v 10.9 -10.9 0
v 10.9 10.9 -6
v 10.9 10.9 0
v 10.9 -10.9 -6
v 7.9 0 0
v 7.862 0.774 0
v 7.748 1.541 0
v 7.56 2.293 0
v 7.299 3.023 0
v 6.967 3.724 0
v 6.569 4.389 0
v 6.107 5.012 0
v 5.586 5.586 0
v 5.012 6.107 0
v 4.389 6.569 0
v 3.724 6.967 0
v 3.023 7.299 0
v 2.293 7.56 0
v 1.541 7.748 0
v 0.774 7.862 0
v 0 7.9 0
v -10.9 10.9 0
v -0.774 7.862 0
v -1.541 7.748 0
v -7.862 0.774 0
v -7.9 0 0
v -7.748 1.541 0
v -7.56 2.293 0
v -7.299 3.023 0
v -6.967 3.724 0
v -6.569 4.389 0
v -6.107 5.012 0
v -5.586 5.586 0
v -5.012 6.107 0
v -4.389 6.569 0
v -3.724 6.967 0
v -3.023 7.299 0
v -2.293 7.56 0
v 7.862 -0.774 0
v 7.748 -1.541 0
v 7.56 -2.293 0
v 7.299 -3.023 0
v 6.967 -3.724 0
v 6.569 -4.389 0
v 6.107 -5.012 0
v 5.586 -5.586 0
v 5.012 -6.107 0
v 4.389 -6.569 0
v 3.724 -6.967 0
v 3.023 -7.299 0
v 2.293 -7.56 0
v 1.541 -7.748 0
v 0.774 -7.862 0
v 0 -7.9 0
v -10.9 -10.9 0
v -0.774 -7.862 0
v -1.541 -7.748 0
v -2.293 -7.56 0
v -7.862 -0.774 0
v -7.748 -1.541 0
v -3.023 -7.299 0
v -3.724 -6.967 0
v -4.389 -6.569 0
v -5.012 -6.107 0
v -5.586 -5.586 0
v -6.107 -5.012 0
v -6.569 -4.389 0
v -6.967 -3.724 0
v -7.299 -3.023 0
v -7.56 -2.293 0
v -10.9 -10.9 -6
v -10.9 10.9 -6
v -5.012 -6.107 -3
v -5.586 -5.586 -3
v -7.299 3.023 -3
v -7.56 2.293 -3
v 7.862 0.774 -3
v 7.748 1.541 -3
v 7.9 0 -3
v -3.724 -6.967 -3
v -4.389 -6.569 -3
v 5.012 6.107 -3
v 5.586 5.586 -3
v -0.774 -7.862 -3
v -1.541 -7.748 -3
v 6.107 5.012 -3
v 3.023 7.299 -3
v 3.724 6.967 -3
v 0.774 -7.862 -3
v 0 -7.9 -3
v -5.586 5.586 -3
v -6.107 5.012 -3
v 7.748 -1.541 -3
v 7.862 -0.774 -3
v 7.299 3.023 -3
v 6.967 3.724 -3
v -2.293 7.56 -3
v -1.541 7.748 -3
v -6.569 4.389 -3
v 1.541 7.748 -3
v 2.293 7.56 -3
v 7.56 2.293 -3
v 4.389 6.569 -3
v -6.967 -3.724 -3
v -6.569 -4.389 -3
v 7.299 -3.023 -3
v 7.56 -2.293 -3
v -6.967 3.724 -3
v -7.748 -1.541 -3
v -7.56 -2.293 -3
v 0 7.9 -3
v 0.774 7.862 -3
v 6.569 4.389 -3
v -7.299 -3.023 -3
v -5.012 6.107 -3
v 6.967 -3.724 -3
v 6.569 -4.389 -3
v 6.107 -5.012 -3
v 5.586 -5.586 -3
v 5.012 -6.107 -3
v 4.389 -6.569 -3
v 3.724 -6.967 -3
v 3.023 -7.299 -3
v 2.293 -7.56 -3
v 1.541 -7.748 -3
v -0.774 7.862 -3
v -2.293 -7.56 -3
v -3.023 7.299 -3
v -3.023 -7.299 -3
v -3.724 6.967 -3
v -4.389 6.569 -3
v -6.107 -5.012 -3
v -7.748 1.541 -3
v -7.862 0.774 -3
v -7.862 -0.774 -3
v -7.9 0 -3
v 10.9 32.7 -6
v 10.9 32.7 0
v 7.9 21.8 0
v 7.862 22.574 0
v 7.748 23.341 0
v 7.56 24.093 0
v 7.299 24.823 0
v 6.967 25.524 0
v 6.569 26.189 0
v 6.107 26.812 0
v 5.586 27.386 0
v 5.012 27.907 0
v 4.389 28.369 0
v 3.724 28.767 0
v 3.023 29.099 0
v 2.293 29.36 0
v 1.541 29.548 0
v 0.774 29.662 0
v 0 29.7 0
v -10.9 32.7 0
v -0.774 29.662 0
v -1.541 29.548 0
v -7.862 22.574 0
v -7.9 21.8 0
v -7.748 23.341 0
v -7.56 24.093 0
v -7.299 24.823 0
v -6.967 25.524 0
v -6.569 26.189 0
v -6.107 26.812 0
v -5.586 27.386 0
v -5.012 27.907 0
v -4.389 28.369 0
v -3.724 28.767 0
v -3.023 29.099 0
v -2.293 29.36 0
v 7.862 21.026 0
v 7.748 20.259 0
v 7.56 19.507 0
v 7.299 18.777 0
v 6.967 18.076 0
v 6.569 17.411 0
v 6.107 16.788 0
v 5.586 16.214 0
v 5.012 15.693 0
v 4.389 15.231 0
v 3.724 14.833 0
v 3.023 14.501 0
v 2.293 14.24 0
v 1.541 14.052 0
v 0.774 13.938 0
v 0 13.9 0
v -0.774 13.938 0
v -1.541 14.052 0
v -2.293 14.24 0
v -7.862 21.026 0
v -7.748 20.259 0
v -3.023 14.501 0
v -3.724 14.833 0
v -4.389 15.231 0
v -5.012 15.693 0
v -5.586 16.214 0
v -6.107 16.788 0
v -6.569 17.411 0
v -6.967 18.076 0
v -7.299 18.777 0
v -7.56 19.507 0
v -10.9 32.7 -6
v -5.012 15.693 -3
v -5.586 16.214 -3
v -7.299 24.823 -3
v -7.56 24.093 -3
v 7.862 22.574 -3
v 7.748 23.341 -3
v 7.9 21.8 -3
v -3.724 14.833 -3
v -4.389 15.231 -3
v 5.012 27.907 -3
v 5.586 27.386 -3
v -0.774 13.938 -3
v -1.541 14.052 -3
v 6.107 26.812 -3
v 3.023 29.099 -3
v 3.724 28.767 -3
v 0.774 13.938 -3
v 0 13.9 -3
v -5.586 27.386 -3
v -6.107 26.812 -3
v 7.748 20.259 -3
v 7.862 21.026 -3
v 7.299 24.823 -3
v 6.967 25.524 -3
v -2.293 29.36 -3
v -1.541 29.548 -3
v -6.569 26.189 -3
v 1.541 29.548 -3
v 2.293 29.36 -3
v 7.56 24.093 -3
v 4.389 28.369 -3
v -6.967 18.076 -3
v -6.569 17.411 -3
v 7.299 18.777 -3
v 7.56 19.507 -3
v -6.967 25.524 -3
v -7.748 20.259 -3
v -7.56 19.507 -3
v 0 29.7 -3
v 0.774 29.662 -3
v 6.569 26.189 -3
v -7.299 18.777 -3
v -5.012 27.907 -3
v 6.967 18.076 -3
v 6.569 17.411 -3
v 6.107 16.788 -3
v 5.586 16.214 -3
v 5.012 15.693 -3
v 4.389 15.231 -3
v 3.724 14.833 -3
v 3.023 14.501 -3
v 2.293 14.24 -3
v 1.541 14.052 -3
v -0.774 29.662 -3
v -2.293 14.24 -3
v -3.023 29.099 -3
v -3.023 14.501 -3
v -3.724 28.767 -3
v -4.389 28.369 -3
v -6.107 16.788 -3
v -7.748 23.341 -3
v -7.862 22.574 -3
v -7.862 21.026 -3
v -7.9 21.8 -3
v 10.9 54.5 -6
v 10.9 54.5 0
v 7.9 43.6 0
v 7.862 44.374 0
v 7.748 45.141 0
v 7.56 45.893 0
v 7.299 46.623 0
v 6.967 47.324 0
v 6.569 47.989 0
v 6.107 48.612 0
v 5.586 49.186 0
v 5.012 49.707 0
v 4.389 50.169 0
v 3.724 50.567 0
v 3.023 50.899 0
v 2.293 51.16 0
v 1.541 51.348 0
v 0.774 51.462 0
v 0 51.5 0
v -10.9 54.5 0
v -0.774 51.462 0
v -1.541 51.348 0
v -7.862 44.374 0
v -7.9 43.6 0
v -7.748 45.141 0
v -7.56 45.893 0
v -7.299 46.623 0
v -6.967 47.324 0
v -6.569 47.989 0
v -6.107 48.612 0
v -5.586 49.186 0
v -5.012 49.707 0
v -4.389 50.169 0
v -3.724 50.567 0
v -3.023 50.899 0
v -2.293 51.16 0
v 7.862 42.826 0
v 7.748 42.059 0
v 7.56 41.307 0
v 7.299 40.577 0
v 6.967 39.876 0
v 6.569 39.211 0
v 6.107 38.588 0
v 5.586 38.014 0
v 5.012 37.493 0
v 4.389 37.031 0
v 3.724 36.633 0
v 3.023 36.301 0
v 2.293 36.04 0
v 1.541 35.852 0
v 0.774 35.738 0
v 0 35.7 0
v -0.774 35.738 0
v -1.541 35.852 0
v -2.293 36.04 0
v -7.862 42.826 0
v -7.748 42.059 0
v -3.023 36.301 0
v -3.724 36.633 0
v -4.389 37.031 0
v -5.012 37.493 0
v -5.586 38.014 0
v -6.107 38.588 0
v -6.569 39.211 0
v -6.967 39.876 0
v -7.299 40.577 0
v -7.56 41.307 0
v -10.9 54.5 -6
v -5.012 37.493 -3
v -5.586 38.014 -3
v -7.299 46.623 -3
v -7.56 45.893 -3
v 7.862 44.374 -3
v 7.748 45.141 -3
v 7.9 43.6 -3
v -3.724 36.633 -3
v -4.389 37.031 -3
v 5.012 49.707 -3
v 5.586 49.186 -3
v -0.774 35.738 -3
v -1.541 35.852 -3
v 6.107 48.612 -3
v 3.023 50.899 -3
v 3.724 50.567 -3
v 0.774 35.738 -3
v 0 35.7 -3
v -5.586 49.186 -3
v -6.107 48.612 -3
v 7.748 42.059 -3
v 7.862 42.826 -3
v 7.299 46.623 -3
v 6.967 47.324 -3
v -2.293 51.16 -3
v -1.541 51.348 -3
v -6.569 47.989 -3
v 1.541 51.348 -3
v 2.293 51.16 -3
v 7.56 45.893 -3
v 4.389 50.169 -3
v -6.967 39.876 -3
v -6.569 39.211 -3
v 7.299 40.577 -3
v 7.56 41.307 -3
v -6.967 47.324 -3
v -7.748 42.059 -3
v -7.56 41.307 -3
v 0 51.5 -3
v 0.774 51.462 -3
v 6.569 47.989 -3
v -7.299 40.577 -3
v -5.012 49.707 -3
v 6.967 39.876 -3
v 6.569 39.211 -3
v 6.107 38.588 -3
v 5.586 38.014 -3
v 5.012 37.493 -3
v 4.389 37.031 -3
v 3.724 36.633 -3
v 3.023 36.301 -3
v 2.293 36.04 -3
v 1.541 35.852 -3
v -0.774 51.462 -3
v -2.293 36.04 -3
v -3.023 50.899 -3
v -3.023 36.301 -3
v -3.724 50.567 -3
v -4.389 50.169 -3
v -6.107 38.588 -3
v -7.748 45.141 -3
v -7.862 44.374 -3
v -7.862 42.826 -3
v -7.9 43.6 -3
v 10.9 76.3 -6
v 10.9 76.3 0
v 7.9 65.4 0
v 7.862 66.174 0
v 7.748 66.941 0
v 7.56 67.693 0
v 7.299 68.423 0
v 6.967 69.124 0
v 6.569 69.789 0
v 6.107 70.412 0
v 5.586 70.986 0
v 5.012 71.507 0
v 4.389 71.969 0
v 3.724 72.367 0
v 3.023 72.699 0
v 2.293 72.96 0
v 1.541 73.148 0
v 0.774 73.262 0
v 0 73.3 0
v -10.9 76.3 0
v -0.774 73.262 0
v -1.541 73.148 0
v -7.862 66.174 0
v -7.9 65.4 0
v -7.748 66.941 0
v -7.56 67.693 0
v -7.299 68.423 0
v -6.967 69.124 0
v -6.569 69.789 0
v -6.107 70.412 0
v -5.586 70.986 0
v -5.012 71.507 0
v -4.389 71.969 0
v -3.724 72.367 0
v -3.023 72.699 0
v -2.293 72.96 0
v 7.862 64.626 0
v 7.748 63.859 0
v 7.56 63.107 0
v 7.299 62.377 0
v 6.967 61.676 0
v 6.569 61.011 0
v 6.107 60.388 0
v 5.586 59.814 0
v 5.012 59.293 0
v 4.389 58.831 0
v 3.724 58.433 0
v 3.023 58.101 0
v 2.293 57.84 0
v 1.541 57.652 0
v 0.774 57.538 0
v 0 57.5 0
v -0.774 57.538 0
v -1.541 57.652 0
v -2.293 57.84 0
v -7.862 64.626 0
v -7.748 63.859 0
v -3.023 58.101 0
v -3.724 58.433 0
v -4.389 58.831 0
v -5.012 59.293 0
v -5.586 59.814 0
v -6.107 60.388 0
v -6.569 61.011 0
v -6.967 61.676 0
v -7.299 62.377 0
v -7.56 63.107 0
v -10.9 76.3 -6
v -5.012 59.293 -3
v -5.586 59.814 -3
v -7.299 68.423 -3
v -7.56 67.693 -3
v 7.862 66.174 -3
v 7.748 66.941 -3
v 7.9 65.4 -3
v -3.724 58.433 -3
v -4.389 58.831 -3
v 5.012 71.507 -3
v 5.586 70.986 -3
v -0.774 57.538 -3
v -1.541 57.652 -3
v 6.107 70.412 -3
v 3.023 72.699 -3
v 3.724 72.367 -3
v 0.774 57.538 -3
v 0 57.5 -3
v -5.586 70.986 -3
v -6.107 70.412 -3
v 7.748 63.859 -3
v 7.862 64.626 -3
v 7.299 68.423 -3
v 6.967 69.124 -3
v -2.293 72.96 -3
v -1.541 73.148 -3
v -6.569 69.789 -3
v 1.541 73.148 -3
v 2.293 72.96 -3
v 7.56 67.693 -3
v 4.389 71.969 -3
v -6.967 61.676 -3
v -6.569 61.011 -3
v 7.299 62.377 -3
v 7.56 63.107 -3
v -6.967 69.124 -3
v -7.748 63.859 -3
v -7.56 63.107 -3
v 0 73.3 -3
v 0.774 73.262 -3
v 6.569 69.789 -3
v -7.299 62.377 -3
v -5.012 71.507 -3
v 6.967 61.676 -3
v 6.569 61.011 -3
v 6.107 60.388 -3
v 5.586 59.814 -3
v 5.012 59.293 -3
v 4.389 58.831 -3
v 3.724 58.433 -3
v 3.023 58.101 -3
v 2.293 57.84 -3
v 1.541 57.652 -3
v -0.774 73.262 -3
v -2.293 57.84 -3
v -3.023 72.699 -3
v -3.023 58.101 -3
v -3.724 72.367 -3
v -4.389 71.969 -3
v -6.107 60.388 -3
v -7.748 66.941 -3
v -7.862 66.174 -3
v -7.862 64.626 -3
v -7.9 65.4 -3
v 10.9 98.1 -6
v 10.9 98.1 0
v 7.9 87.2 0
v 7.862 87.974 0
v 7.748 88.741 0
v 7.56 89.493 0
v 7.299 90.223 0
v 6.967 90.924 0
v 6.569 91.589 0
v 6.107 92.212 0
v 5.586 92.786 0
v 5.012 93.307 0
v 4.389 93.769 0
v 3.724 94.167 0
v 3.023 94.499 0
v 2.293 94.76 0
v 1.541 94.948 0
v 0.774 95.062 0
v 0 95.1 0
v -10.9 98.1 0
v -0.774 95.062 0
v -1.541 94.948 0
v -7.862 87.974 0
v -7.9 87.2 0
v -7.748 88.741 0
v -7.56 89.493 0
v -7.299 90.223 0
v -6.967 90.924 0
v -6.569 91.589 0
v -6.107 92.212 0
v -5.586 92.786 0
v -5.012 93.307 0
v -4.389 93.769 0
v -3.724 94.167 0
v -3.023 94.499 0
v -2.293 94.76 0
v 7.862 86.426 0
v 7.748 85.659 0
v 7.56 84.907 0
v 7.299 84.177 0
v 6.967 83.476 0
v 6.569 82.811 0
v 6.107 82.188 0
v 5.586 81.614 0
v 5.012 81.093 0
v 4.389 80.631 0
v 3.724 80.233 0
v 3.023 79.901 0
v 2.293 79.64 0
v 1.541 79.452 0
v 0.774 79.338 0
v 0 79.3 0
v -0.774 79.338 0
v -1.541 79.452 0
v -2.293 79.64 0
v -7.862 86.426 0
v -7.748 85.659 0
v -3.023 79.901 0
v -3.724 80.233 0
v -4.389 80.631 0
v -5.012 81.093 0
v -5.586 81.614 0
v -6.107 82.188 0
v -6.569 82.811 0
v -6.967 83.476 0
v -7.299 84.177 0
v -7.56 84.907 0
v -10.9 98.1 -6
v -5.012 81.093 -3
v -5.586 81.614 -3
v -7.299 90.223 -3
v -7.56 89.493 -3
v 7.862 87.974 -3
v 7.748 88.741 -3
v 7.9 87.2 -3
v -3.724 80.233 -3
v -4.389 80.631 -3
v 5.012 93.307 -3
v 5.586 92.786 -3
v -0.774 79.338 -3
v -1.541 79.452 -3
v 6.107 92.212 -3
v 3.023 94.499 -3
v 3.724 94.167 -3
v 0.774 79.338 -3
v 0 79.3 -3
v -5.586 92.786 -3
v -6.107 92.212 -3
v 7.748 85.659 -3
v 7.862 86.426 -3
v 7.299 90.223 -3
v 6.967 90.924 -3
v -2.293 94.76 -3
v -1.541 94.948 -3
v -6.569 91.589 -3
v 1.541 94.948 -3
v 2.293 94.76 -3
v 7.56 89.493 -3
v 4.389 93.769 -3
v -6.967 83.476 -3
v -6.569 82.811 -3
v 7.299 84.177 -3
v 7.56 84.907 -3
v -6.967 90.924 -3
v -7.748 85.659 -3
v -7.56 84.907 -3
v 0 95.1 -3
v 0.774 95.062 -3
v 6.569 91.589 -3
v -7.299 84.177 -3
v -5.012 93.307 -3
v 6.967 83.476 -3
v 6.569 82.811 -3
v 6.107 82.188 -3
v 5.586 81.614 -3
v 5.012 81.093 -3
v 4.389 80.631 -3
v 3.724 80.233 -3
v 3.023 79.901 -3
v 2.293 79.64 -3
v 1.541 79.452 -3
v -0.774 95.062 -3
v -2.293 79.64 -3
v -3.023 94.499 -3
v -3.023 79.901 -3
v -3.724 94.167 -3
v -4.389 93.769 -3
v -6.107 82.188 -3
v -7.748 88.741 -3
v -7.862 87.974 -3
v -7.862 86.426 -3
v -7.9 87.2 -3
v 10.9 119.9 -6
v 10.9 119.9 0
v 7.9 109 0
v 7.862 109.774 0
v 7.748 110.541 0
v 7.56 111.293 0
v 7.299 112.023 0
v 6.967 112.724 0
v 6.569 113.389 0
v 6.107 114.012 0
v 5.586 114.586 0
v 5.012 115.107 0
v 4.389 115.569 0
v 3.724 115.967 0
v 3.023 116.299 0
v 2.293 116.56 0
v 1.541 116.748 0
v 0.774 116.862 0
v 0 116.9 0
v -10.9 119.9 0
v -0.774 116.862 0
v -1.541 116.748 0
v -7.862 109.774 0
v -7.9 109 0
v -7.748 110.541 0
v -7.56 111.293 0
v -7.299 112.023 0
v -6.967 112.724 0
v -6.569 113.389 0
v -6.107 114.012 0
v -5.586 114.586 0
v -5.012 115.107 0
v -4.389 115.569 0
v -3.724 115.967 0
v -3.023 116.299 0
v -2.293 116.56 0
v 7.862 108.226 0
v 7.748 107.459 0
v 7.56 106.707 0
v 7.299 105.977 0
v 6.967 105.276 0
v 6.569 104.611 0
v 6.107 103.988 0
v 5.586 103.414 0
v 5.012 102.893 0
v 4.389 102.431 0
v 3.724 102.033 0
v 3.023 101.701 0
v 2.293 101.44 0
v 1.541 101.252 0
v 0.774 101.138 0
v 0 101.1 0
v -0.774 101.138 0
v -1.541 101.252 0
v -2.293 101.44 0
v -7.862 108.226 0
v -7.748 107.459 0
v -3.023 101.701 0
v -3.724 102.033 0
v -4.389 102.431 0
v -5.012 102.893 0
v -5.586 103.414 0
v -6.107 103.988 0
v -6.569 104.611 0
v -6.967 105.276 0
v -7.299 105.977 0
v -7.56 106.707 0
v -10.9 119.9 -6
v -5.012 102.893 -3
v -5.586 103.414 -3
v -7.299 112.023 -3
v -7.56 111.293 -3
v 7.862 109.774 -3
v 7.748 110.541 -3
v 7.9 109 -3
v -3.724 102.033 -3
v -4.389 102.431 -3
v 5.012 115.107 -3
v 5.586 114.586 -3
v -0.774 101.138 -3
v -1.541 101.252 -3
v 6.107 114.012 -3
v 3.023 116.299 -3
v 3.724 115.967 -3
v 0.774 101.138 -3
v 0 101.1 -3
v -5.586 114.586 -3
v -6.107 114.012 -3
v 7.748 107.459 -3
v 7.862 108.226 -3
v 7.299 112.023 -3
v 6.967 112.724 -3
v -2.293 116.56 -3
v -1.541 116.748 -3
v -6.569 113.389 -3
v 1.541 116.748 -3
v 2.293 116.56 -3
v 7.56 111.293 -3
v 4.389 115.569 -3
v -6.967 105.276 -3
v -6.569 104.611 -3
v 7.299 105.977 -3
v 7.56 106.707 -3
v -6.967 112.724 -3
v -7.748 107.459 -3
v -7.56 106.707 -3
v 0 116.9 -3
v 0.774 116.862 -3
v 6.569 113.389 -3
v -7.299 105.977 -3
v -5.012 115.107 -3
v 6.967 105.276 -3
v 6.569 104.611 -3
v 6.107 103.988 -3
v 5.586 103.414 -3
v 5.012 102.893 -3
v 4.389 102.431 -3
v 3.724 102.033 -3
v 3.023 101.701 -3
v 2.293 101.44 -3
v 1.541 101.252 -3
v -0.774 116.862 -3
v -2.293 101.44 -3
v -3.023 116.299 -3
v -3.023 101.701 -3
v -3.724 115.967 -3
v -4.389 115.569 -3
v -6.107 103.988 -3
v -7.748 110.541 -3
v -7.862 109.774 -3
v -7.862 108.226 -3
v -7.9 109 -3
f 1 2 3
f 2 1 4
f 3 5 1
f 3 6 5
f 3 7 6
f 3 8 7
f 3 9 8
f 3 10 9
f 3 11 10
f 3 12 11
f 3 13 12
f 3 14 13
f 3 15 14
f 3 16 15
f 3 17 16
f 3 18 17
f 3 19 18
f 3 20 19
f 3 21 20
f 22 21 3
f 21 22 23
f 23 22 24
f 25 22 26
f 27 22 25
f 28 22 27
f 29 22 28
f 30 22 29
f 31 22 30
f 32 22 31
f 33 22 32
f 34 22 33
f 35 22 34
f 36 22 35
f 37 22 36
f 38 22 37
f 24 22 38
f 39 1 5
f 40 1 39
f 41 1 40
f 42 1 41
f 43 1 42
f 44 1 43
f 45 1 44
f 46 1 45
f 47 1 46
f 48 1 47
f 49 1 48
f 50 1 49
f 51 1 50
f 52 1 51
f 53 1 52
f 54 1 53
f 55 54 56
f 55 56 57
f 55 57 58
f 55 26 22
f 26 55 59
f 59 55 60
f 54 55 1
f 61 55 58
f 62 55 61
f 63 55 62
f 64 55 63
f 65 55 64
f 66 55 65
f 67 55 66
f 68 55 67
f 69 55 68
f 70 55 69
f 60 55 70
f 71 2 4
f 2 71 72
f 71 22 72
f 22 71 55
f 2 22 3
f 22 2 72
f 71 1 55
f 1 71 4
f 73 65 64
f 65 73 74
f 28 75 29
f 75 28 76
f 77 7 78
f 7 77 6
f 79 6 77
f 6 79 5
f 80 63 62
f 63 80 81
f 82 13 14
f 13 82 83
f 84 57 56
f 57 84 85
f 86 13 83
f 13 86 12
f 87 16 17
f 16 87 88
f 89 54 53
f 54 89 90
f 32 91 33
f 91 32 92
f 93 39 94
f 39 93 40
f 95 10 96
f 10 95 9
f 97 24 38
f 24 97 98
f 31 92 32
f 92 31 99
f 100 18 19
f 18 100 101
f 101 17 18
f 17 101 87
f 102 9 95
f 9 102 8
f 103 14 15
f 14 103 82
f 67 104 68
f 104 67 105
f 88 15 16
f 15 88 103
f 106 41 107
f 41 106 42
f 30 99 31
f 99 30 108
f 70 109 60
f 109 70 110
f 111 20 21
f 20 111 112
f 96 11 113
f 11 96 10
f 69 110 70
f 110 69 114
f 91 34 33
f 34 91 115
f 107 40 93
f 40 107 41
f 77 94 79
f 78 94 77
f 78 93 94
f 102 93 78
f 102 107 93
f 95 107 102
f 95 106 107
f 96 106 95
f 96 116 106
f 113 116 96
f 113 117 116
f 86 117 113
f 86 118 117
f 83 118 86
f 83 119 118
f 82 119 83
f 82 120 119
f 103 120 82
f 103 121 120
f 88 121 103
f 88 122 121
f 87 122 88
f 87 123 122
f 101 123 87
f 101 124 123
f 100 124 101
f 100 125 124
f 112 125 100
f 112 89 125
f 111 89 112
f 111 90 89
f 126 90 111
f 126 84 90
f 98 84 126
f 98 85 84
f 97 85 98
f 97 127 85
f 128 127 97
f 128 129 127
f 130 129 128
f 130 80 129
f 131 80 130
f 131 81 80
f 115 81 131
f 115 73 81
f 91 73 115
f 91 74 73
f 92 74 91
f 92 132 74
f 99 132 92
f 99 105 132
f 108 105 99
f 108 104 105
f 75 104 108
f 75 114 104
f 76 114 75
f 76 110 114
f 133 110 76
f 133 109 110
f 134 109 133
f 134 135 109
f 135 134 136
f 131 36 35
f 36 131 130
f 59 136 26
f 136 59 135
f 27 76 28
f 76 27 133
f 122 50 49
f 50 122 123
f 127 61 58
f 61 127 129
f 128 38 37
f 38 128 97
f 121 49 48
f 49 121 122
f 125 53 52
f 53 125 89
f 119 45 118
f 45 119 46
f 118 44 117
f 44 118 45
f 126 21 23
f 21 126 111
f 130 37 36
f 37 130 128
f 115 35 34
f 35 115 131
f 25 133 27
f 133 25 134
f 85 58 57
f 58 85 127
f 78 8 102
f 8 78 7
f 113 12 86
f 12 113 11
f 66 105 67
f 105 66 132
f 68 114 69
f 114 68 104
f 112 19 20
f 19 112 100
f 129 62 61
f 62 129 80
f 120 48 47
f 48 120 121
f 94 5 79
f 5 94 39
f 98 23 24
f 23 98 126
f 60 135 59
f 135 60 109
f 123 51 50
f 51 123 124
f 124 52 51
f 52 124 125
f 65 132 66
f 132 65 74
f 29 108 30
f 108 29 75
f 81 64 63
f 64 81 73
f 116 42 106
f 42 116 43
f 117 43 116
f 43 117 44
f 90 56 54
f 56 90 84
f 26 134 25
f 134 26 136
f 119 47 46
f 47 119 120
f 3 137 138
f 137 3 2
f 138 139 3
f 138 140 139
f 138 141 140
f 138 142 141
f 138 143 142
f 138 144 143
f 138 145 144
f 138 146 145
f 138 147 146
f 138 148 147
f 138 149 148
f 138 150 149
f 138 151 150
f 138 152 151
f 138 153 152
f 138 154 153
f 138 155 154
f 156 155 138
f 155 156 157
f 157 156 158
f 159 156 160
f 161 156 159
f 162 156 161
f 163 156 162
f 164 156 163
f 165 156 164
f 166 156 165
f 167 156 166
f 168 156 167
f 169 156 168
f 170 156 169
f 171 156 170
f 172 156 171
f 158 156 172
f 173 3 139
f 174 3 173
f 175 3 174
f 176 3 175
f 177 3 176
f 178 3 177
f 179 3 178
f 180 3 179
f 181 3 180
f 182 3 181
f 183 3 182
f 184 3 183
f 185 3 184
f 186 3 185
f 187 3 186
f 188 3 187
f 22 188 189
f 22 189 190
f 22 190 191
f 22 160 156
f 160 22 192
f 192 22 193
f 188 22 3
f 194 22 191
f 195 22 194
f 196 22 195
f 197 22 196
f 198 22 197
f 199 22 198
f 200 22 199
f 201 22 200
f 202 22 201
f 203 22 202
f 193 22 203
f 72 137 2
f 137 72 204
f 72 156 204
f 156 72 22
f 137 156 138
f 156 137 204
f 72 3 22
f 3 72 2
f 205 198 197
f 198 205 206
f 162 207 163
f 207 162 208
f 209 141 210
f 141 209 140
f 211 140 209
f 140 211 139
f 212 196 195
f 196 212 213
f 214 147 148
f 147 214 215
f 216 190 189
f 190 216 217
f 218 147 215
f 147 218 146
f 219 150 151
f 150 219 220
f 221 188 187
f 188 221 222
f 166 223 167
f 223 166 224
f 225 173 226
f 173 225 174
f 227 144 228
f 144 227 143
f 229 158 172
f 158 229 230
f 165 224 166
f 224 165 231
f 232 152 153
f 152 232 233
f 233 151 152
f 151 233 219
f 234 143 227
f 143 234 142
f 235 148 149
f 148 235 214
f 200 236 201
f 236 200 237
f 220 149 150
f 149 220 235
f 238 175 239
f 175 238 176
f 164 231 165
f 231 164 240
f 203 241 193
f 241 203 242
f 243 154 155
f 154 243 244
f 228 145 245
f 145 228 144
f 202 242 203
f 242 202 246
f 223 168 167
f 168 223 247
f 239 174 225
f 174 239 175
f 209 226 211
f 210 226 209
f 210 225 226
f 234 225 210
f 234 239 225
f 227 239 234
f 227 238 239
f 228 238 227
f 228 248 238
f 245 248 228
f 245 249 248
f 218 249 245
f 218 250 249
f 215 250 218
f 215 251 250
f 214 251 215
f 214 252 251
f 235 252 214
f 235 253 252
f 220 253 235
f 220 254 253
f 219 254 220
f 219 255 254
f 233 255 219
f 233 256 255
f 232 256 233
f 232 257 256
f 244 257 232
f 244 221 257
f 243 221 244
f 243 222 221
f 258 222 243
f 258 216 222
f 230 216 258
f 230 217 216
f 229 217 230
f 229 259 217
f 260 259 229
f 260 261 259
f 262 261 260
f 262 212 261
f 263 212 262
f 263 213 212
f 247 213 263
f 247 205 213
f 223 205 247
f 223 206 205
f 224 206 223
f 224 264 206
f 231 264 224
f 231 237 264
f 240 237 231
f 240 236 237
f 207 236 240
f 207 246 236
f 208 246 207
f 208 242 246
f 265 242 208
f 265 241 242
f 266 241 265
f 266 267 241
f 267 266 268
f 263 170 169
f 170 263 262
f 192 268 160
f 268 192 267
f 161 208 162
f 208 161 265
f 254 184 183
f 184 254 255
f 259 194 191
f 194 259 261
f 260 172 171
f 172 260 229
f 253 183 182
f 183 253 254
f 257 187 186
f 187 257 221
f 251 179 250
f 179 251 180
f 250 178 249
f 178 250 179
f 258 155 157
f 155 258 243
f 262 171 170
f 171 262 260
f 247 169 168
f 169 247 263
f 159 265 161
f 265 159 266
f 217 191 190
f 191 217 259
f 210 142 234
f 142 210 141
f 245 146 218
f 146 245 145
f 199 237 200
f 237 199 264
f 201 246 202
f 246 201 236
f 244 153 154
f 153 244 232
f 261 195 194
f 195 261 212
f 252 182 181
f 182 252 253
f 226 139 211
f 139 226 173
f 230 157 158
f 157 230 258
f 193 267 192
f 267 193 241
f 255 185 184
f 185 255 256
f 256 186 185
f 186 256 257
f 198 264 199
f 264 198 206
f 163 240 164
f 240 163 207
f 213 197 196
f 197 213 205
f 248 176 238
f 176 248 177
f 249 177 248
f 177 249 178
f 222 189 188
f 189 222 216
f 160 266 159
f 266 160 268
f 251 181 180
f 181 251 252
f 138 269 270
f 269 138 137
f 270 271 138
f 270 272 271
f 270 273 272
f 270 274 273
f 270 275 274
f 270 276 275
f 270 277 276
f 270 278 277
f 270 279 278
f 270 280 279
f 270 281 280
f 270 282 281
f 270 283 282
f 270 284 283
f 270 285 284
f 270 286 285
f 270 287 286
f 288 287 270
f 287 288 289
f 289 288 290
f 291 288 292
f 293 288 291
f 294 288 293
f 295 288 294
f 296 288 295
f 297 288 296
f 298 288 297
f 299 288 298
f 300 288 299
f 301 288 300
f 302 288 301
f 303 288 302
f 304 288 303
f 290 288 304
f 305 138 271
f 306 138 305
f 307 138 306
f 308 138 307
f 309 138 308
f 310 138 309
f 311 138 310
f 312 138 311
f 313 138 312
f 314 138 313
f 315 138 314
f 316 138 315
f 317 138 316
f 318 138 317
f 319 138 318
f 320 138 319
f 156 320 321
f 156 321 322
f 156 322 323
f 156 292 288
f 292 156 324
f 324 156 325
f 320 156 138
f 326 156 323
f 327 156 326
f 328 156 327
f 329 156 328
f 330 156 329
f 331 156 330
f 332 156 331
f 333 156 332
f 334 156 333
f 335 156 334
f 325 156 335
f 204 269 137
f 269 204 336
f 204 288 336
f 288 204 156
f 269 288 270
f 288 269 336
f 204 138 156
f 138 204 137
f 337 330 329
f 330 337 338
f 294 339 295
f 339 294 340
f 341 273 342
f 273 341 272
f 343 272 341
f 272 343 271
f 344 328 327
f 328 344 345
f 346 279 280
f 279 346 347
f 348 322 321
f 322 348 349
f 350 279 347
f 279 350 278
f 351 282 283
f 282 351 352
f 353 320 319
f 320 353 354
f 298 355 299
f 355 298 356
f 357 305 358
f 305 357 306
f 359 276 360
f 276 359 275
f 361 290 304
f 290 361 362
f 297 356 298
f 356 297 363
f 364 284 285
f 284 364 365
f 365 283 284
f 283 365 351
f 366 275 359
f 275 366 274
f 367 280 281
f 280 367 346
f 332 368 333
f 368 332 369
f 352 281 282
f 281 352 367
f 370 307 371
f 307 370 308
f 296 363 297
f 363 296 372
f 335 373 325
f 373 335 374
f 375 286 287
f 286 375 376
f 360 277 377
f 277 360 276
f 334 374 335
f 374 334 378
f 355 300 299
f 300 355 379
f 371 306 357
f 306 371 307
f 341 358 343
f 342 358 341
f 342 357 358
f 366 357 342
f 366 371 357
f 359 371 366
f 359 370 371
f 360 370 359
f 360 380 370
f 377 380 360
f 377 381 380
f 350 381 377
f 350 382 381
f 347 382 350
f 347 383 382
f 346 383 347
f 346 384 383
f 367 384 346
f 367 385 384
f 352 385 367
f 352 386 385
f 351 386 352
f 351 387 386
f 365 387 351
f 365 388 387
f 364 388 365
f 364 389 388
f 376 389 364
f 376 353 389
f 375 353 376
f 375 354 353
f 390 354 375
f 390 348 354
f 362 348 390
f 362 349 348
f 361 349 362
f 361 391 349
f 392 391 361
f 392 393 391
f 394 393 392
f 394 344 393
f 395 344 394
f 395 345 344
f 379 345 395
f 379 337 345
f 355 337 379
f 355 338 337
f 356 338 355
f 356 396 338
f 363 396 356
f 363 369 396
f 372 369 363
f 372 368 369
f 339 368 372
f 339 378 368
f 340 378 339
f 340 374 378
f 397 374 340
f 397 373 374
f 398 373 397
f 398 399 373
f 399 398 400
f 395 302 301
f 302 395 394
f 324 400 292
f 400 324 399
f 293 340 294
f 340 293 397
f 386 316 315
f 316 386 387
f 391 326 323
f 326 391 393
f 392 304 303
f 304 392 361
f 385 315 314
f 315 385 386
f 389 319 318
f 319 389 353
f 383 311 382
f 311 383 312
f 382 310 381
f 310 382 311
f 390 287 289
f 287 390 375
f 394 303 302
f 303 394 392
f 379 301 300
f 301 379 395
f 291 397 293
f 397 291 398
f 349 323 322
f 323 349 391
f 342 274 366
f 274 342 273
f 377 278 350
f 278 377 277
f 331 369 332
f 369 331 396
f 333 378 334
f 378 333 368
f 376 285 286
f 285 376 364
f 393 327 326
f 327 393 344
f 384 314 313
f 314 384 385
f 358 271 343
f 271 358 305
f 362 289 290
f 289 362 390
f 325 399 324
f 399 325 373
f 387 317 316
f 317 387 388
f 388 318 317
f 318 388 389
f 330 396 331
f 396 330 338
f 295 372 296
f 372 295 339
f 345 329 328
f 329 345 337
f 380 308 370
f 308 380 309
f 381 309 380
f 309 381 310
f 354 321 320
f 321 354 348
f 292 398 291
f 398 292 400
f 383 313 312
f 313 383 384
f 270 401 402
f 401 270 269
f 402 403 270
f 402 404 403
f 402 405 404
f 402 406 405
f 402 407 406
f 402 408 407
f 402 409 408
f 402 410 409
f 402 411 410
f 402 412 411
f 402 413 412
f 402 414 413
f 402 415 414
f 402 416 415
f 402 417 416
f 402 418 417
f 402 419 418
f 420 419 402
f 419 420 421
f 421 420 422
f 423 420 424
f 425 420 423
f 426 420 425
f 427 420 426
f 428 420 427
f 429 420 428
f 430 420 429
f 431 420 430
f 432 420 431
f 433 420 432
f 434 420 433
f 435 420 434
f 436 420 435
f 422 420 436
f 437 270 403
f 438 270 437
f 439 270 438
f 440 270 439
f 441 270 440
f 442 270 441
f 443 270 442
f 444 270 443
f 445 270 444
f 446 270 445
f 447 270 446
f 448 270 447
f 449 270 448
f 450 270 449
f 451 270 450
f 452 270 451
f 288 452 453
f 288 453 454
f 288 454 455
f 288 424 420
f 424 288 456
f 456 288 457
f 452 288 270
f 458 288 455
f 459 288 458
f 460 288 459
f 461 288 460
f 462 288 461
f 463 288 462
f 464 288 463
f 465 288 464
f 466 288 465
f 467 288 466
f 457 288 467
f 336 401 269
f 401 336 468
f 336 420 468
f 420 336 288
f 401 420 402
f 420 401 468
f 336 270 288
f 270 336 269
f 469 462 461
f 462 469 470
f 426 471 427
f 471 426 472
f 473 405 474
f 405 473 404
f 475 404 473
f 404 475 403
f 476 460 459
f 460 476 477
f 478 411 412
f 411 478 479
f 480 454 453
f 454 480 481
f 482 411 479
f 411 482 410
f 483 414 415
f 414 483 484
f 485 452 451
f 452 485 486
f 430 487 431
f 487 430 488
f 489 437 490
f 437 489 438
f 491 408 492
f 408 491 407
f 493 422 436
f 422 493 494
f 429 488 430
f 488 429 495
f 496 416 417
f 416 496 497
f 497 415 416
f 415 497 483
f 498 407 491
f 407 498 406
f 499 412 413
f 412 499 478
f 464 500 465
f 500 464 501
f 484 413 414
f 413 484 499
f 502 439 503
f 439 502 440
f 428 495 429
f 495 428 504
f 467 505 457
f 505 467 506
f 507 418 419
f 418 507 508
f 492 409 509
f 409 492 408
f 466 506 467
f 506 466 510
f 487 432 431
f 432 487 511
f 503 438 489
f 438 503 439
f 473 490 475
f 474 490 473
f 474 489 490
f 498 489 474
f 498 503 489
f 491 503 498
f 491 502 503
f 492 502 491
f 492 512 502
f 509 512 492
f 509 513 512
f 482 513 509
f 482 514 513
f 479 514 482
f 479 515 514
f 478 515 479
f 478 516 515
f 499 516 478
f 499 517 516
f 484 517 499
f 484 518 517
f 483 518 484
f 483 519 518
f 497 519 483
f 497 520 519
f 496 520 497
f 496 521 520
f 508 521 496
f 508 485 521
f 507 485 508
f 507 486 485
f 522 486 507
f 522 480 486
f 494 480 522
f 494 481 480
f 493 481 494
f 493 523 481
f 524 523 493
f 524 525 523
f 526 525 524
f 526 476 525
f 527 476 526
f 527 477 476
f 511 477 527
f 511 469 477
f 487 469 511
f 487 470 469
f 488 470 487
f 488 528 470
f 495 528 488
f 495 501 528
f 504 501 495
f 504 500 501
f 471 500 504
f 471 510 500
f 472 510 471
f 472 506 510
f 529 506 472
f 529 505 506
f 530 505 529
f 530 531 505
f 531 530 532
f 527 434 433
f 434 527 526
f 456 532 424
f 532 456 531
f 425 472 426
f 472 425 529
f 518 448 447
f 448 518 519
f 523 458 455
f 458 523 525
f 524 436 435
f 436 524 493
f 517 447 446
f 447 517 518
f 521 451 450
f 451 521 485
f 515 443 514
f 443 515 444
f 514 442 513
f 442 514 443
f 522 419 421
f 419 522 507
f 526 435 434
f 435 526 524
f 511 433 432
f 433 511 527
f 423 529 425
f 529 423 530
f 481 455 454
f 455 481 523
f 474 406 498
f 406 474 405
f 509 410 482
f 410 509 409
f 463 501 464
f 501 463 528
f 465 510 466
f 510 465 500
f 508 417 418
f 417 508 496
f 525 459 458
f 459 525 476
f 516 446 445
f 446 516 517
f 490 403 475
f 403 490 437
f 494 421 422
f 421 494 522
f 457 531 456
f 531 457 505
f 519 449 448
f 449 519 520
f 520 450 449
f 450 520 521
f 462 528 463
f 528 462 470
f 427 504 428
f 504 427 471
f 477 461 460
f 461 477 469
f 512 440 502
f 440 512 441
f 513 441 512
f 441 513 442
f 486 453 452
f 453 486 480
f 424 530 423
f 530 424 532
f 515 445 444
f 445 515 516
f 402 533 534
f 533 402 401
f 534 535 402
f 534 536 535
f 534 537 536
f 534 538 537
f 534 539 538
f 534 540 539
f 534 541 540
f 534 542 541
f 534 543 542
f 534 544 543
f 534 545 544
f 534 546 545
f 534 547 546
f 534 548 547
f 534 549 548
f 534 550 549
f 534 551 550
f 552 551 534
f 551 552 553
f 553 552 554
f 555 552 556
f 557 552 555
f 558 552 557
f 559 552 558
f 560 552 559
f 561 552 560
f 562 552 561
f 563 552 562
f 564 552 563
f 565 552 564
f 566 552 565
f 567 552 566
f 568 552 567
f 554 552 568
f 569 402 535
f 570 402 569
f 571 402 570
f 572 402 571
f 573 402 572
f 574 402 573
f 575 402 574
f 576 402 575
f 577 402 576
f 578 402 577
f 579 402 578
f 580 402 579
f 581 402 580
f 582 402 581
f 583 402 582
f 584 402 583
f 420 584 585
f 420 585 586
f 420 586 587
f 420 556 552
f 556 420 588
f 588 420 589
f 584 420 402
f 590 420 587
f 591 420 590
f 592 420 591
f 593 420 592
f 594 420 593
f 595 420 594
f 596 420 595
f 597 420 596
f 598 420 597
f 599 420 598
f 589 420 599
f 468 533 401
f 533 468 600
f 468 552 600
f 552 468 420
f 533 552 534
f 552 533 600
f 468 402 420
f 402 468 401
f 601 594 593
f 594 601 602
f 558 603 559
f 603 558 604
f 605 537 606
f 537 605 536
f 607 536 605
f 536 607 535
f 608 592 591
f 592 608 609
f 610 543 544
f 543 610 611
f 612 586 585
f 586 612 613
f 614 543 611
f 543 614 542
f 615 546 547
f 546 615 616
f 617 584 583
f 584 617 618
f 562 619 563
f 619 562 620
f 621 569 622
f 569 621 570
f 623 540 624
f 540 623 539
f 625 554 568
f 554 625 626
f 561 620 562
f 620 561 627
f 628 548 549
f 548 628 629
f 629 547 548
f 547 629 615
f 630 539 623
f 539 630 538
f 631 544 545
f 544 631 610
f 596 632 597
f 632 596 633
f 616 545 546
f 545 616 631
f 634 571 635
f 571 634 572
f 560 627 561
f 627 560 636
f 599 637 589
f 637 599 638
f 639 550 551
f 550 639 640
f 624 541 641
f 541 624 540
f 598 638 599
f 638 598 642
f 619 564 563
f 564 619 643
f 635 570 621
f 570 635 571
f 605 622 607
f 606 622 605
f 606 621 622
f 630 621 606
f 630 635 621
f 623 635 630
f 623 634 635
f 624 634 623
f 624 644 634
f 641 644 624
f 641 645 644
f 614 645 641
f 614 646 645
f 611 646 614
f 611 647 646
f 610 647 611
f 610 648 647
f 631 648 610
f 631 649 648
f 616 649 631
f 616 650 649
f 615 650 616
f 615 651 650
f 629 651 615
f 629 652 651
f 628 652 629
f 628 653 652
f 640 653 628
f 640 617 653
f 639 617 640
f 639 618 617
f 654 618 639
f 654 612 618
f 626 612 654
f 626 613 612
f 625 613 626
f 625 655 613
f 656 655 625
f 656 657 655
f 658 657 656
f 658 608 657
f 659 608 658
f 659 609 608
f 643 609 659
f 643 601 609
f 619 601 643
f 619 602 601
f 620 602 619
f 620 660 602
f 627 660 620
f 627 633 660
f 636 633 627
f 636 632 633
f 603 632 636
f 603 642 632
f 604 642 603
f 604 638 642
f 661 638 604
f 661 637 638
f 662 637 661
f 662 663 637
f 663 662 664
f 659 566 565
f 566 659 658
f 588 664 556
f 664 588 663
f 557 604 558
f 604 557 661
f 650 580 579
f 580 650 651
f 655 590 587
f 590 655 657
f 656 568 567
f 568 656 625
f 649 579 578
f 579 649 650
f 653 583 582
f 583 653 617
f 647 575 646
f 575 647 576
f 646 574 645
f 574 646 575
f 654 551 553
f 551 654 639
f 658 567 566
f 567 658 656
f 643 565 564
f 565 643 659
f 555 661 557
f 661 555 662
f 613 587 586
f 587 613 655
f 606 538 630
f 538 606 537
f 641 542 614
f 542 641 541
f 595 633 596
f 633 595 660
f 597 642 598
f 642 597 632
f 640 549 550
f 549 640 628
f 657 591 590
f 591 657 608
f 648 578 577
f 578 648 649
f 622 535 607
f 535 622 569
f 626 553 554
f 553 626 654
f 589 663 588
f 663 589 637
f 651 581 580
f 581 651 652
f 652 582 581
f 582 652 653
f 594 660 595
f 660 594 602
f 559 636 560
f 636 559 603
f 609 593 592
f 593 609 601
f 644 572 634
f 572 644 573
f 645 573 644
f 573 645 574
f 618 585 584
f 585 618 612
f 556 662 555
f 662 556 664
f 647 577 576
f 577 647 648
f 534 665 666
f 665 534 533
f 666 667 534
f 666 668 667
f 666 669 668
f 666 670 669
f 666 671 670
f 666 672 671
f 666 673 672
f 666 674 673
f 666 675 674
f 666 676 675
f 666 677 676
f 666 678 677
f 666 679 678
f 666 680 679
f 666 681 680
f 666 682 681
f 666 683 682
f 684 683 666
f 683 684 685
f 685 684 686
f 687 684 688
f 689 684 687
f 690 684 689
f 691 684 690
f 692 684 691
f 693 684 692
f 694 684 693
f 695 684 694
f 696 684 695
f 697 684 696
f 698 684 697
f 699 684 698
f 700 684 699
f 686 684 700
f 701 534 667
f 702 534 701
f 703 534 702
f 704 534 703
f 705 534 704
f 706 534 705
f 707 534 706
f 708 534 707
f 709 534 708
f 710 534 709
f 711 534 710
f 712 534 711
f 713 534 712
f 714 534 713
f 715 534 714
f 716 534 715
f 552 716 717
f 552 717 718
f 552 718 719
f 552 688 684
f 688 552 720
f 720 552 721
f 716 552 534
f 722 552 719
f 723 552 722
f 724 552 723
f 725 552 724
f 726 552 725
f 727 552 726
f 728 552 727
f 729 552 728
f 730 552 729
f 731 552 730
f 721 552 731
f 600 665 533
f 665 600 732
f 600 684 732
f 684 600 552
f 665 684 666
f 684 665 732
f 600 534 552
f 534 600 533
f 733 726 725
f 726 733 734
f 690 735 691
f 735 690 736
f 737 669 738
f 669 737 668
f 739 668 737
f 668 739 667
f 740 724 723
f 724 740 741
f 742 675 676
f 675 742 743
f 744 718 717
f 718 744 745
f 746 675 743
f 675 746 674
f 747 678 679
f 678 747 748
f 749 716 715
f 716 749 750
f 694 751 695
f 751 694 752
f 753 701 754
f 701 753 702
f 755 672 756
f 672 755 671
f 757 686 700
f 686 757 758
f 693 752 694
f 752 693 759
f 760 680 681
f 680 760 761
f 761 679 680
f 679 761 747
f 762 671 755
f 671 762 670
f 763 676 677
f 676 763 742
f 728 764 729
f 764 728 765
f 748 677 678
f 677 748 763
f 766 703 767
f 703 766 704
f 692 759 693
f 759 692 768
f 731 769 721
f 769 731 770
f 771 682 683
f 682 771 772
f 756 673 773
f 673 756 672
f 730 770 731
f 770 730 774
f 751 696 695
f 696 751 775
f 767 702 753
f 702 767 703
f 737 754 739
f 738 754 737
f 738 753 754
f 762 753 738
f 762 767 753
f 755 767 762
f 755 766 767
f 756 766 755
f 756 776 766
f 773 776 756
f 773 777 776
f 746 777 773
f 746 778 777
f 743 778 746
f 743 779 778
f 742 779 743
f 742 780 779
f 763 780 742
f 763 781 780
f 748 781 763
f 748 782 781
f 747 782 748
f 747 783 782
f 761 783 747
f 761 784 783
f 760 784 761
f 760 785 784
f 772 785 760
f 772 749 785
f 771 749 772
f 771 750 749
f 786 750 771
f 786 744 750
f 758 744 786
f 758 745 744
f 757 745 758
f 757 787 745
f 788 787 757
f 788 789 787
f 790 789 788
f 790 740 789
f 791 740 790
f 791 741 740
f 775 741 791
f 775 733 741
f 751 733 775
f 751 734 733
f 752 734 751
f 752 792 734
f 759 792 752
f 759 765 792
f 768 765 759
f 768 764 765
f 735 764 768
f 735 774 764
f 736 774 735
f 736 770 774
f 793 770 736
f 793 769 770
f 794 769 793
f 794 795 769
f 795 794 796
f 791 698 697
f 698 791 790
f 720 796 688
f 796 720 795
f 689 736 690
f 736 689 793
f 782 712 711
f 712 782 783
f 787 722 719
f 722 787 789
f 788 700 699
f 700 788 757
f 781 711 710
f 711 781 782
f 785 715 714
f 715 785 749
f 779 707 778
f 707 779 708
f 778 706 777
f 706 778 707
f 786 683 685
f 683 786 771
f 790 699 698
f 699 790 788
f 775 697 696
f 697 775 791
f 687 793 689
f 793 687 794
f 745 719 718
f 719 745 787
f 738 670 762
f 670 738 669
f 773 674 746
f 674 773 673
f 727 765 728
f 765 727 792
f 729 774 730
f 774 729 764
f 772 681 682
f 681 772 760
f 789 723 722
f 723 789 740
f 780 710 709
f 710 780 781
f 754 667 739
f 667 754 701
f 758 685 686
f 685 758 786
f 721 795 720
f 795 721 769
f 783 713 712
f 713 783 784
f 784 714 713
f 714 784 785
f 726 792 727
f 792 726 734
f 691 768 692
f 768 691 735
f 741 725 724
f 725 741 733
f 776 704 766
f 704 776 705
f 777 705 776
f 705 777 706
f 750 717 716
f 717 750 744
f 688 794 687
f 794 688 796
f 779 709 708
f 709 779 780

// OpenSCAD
// Generated by SolidPython 1.1.3 on 2024-01-10 10:53:05


union() {
	translate(v = [0.0000000000, 0.0000000000, 0.0000000000]) {
		difference() {
			translate(v = [0, 0, -3.0000000000]) {
				cube(center = true, size = [21.8000000000, 21.8000000000, 6]);
			}
			translate(v = [0, 0, -1.5000000000]) {
				cylinder($fn = 64, center = true, h = 3, r = 7.9000000000);
			}
		}
	}
	translate(v = [0.0000000000, 21.8000000000, 0.0000000000]) {
		difference() {
			translate(v = [0, 0, -3.0000000000]) {
				cube(center = true, size = [21.8000000000, 21.8000000000, 6]);
			}
			translate(v = [0, 0, -1.5000000000]) {
				cylinder($fn = 64, center = true, h = 3, r = 7.9000000000);
			}
		}
	}
	translate(v = [0.0000000000, 43.6000000000, 0.0000000000]) {
		difference() {
			translate(v = [0, 0, -3.0000000000]) {
				cube(center = true, size = [21.8000000000, 21.8000000000, 6]);
			}
			translate(v = [0, 0, -1.5000000000]) {
				cylinder($fn = 64, center = true, h = 3, r = 7.9000000000);
			}
		}
	}
	translate(v = [0.0000000000, 65.4000000000, 0.0000000000]) {
		difference() {
			translate(v = [0, 0, -3.0000000000]) {
				cube(center = true, size = [21.8000000000, 21.8000000000, 6]);
			}
			translate(v = [0, 0, -1.5000000000]) {
				cylinder($fn = 64, center = true, h = 3, r = 7.9000000000);
			}
		}
	}
	translate(v = [0.0000000000, 87.2000000000, 0.0000000000]) {
		difference() {
			translate(v = [0, 0, -3.0000000000]) {
				cube(center = true, size = [21.8000000000, 21.8000000000, 6]);
			}
			translate(v = [0, 0, -1.5000000000]) {
				cylinder($fn = 64, center = true, h = 3, r = 7.9000000000);
			}
		}
	}
	translate(v = [0.0000000000, 109.0000000000, 0.0000000000]) {
		difference() {
			translate(v = [0, 0, -3.0000000000]) {
				cube(center = true, size = [21.8000000000, 21.8000000000, 6]);
			}
			translate(v = [0, 0, -1.5000000000]) {
				cylinder($fn = 64, center = true, h = 3, r = 7.9000000000);
			}
		}
	}
}
/***********************************************
*********      SolidPython code:      **********
************************************************
 
import solid
import os
import os.path as osp
from make_device import make_unit_array

def save_model(model,base_path,base_name):
    if not osp.exists(base_path):
        os.makedirs(base_path)
    scad_path=osp.join(base_path,base_name+".scad")
    solid.scad_render_to_file(model,osp.join(scad_path))


def create_rack(item_diameter,item_thickness,rack_height,base_name,base_path,item_diameter_extra=0,item_thickness_extra=0,rack_size_extra=0,grid_size=[1,1]):
    holder_size=(item_diameter+item_diameter_extra+rack_size_extra,item_diameter+item_diameter_extra+rack_size_extra)
    dims = [*holder_size, 0]
    height= item_thickness+item_thickness_extra
    radius=(item_diameter+item_diameter_extra)/2.0
    hole = solid.cylinder(r=radius, h=height, segments=64, center = True)
    hole = solid.translate([0,0,-height/2.0])(hole)
    holder = solid.cube((*holder_size,rack_height), center = True)
    holder = solid.translate([0,0,-rack_height/2.0])(holder)
    holder = solid.difference()(holder,hole)
    holder=make_unit_array(holder,dims,grid_size)
    save_model(holder,base_path,base_name)

version="v3"
base_path="./designs/plasma_racks/4mm_well_0.5inch_diam_device_"+version+"/"
#coverslip glass holder
item_diameter=18
item_diameter_extra=1
item_thickness=0.16
item_thickness_extra=0.04
rack_height=4
rack_size_extra=6
base_name="18CIR-1_rack_"+version
grid_size=[1,6]
create_rack(item_diameter,item_thickness,rack_height,base_name,base_path,item_diameter_extra=item_diameter_extra,item_thickness_extra=item_thickness_extra,rack_size_extra=rack_size_extra,grid_size=grid_size)

#0.5" diam device holder
item_diameter=15.8
item_diameter_extra=0
item_thickness=3
item_thickness_extra=0
rack_height=6
rack_size_extra=6
base_name="0.5inch_4mm_device_rack_"+version
grid_size=[1,6]
create_rack(item_diameter,item_thickness,rack_height,base_name,base_path,item_diameter_extra=item_diameter_extra,item_thickness_extra=item_thickness_extra,rack_size_extra=rack_size_extra,grid_size=grid_size)

 
 
************************************************/
